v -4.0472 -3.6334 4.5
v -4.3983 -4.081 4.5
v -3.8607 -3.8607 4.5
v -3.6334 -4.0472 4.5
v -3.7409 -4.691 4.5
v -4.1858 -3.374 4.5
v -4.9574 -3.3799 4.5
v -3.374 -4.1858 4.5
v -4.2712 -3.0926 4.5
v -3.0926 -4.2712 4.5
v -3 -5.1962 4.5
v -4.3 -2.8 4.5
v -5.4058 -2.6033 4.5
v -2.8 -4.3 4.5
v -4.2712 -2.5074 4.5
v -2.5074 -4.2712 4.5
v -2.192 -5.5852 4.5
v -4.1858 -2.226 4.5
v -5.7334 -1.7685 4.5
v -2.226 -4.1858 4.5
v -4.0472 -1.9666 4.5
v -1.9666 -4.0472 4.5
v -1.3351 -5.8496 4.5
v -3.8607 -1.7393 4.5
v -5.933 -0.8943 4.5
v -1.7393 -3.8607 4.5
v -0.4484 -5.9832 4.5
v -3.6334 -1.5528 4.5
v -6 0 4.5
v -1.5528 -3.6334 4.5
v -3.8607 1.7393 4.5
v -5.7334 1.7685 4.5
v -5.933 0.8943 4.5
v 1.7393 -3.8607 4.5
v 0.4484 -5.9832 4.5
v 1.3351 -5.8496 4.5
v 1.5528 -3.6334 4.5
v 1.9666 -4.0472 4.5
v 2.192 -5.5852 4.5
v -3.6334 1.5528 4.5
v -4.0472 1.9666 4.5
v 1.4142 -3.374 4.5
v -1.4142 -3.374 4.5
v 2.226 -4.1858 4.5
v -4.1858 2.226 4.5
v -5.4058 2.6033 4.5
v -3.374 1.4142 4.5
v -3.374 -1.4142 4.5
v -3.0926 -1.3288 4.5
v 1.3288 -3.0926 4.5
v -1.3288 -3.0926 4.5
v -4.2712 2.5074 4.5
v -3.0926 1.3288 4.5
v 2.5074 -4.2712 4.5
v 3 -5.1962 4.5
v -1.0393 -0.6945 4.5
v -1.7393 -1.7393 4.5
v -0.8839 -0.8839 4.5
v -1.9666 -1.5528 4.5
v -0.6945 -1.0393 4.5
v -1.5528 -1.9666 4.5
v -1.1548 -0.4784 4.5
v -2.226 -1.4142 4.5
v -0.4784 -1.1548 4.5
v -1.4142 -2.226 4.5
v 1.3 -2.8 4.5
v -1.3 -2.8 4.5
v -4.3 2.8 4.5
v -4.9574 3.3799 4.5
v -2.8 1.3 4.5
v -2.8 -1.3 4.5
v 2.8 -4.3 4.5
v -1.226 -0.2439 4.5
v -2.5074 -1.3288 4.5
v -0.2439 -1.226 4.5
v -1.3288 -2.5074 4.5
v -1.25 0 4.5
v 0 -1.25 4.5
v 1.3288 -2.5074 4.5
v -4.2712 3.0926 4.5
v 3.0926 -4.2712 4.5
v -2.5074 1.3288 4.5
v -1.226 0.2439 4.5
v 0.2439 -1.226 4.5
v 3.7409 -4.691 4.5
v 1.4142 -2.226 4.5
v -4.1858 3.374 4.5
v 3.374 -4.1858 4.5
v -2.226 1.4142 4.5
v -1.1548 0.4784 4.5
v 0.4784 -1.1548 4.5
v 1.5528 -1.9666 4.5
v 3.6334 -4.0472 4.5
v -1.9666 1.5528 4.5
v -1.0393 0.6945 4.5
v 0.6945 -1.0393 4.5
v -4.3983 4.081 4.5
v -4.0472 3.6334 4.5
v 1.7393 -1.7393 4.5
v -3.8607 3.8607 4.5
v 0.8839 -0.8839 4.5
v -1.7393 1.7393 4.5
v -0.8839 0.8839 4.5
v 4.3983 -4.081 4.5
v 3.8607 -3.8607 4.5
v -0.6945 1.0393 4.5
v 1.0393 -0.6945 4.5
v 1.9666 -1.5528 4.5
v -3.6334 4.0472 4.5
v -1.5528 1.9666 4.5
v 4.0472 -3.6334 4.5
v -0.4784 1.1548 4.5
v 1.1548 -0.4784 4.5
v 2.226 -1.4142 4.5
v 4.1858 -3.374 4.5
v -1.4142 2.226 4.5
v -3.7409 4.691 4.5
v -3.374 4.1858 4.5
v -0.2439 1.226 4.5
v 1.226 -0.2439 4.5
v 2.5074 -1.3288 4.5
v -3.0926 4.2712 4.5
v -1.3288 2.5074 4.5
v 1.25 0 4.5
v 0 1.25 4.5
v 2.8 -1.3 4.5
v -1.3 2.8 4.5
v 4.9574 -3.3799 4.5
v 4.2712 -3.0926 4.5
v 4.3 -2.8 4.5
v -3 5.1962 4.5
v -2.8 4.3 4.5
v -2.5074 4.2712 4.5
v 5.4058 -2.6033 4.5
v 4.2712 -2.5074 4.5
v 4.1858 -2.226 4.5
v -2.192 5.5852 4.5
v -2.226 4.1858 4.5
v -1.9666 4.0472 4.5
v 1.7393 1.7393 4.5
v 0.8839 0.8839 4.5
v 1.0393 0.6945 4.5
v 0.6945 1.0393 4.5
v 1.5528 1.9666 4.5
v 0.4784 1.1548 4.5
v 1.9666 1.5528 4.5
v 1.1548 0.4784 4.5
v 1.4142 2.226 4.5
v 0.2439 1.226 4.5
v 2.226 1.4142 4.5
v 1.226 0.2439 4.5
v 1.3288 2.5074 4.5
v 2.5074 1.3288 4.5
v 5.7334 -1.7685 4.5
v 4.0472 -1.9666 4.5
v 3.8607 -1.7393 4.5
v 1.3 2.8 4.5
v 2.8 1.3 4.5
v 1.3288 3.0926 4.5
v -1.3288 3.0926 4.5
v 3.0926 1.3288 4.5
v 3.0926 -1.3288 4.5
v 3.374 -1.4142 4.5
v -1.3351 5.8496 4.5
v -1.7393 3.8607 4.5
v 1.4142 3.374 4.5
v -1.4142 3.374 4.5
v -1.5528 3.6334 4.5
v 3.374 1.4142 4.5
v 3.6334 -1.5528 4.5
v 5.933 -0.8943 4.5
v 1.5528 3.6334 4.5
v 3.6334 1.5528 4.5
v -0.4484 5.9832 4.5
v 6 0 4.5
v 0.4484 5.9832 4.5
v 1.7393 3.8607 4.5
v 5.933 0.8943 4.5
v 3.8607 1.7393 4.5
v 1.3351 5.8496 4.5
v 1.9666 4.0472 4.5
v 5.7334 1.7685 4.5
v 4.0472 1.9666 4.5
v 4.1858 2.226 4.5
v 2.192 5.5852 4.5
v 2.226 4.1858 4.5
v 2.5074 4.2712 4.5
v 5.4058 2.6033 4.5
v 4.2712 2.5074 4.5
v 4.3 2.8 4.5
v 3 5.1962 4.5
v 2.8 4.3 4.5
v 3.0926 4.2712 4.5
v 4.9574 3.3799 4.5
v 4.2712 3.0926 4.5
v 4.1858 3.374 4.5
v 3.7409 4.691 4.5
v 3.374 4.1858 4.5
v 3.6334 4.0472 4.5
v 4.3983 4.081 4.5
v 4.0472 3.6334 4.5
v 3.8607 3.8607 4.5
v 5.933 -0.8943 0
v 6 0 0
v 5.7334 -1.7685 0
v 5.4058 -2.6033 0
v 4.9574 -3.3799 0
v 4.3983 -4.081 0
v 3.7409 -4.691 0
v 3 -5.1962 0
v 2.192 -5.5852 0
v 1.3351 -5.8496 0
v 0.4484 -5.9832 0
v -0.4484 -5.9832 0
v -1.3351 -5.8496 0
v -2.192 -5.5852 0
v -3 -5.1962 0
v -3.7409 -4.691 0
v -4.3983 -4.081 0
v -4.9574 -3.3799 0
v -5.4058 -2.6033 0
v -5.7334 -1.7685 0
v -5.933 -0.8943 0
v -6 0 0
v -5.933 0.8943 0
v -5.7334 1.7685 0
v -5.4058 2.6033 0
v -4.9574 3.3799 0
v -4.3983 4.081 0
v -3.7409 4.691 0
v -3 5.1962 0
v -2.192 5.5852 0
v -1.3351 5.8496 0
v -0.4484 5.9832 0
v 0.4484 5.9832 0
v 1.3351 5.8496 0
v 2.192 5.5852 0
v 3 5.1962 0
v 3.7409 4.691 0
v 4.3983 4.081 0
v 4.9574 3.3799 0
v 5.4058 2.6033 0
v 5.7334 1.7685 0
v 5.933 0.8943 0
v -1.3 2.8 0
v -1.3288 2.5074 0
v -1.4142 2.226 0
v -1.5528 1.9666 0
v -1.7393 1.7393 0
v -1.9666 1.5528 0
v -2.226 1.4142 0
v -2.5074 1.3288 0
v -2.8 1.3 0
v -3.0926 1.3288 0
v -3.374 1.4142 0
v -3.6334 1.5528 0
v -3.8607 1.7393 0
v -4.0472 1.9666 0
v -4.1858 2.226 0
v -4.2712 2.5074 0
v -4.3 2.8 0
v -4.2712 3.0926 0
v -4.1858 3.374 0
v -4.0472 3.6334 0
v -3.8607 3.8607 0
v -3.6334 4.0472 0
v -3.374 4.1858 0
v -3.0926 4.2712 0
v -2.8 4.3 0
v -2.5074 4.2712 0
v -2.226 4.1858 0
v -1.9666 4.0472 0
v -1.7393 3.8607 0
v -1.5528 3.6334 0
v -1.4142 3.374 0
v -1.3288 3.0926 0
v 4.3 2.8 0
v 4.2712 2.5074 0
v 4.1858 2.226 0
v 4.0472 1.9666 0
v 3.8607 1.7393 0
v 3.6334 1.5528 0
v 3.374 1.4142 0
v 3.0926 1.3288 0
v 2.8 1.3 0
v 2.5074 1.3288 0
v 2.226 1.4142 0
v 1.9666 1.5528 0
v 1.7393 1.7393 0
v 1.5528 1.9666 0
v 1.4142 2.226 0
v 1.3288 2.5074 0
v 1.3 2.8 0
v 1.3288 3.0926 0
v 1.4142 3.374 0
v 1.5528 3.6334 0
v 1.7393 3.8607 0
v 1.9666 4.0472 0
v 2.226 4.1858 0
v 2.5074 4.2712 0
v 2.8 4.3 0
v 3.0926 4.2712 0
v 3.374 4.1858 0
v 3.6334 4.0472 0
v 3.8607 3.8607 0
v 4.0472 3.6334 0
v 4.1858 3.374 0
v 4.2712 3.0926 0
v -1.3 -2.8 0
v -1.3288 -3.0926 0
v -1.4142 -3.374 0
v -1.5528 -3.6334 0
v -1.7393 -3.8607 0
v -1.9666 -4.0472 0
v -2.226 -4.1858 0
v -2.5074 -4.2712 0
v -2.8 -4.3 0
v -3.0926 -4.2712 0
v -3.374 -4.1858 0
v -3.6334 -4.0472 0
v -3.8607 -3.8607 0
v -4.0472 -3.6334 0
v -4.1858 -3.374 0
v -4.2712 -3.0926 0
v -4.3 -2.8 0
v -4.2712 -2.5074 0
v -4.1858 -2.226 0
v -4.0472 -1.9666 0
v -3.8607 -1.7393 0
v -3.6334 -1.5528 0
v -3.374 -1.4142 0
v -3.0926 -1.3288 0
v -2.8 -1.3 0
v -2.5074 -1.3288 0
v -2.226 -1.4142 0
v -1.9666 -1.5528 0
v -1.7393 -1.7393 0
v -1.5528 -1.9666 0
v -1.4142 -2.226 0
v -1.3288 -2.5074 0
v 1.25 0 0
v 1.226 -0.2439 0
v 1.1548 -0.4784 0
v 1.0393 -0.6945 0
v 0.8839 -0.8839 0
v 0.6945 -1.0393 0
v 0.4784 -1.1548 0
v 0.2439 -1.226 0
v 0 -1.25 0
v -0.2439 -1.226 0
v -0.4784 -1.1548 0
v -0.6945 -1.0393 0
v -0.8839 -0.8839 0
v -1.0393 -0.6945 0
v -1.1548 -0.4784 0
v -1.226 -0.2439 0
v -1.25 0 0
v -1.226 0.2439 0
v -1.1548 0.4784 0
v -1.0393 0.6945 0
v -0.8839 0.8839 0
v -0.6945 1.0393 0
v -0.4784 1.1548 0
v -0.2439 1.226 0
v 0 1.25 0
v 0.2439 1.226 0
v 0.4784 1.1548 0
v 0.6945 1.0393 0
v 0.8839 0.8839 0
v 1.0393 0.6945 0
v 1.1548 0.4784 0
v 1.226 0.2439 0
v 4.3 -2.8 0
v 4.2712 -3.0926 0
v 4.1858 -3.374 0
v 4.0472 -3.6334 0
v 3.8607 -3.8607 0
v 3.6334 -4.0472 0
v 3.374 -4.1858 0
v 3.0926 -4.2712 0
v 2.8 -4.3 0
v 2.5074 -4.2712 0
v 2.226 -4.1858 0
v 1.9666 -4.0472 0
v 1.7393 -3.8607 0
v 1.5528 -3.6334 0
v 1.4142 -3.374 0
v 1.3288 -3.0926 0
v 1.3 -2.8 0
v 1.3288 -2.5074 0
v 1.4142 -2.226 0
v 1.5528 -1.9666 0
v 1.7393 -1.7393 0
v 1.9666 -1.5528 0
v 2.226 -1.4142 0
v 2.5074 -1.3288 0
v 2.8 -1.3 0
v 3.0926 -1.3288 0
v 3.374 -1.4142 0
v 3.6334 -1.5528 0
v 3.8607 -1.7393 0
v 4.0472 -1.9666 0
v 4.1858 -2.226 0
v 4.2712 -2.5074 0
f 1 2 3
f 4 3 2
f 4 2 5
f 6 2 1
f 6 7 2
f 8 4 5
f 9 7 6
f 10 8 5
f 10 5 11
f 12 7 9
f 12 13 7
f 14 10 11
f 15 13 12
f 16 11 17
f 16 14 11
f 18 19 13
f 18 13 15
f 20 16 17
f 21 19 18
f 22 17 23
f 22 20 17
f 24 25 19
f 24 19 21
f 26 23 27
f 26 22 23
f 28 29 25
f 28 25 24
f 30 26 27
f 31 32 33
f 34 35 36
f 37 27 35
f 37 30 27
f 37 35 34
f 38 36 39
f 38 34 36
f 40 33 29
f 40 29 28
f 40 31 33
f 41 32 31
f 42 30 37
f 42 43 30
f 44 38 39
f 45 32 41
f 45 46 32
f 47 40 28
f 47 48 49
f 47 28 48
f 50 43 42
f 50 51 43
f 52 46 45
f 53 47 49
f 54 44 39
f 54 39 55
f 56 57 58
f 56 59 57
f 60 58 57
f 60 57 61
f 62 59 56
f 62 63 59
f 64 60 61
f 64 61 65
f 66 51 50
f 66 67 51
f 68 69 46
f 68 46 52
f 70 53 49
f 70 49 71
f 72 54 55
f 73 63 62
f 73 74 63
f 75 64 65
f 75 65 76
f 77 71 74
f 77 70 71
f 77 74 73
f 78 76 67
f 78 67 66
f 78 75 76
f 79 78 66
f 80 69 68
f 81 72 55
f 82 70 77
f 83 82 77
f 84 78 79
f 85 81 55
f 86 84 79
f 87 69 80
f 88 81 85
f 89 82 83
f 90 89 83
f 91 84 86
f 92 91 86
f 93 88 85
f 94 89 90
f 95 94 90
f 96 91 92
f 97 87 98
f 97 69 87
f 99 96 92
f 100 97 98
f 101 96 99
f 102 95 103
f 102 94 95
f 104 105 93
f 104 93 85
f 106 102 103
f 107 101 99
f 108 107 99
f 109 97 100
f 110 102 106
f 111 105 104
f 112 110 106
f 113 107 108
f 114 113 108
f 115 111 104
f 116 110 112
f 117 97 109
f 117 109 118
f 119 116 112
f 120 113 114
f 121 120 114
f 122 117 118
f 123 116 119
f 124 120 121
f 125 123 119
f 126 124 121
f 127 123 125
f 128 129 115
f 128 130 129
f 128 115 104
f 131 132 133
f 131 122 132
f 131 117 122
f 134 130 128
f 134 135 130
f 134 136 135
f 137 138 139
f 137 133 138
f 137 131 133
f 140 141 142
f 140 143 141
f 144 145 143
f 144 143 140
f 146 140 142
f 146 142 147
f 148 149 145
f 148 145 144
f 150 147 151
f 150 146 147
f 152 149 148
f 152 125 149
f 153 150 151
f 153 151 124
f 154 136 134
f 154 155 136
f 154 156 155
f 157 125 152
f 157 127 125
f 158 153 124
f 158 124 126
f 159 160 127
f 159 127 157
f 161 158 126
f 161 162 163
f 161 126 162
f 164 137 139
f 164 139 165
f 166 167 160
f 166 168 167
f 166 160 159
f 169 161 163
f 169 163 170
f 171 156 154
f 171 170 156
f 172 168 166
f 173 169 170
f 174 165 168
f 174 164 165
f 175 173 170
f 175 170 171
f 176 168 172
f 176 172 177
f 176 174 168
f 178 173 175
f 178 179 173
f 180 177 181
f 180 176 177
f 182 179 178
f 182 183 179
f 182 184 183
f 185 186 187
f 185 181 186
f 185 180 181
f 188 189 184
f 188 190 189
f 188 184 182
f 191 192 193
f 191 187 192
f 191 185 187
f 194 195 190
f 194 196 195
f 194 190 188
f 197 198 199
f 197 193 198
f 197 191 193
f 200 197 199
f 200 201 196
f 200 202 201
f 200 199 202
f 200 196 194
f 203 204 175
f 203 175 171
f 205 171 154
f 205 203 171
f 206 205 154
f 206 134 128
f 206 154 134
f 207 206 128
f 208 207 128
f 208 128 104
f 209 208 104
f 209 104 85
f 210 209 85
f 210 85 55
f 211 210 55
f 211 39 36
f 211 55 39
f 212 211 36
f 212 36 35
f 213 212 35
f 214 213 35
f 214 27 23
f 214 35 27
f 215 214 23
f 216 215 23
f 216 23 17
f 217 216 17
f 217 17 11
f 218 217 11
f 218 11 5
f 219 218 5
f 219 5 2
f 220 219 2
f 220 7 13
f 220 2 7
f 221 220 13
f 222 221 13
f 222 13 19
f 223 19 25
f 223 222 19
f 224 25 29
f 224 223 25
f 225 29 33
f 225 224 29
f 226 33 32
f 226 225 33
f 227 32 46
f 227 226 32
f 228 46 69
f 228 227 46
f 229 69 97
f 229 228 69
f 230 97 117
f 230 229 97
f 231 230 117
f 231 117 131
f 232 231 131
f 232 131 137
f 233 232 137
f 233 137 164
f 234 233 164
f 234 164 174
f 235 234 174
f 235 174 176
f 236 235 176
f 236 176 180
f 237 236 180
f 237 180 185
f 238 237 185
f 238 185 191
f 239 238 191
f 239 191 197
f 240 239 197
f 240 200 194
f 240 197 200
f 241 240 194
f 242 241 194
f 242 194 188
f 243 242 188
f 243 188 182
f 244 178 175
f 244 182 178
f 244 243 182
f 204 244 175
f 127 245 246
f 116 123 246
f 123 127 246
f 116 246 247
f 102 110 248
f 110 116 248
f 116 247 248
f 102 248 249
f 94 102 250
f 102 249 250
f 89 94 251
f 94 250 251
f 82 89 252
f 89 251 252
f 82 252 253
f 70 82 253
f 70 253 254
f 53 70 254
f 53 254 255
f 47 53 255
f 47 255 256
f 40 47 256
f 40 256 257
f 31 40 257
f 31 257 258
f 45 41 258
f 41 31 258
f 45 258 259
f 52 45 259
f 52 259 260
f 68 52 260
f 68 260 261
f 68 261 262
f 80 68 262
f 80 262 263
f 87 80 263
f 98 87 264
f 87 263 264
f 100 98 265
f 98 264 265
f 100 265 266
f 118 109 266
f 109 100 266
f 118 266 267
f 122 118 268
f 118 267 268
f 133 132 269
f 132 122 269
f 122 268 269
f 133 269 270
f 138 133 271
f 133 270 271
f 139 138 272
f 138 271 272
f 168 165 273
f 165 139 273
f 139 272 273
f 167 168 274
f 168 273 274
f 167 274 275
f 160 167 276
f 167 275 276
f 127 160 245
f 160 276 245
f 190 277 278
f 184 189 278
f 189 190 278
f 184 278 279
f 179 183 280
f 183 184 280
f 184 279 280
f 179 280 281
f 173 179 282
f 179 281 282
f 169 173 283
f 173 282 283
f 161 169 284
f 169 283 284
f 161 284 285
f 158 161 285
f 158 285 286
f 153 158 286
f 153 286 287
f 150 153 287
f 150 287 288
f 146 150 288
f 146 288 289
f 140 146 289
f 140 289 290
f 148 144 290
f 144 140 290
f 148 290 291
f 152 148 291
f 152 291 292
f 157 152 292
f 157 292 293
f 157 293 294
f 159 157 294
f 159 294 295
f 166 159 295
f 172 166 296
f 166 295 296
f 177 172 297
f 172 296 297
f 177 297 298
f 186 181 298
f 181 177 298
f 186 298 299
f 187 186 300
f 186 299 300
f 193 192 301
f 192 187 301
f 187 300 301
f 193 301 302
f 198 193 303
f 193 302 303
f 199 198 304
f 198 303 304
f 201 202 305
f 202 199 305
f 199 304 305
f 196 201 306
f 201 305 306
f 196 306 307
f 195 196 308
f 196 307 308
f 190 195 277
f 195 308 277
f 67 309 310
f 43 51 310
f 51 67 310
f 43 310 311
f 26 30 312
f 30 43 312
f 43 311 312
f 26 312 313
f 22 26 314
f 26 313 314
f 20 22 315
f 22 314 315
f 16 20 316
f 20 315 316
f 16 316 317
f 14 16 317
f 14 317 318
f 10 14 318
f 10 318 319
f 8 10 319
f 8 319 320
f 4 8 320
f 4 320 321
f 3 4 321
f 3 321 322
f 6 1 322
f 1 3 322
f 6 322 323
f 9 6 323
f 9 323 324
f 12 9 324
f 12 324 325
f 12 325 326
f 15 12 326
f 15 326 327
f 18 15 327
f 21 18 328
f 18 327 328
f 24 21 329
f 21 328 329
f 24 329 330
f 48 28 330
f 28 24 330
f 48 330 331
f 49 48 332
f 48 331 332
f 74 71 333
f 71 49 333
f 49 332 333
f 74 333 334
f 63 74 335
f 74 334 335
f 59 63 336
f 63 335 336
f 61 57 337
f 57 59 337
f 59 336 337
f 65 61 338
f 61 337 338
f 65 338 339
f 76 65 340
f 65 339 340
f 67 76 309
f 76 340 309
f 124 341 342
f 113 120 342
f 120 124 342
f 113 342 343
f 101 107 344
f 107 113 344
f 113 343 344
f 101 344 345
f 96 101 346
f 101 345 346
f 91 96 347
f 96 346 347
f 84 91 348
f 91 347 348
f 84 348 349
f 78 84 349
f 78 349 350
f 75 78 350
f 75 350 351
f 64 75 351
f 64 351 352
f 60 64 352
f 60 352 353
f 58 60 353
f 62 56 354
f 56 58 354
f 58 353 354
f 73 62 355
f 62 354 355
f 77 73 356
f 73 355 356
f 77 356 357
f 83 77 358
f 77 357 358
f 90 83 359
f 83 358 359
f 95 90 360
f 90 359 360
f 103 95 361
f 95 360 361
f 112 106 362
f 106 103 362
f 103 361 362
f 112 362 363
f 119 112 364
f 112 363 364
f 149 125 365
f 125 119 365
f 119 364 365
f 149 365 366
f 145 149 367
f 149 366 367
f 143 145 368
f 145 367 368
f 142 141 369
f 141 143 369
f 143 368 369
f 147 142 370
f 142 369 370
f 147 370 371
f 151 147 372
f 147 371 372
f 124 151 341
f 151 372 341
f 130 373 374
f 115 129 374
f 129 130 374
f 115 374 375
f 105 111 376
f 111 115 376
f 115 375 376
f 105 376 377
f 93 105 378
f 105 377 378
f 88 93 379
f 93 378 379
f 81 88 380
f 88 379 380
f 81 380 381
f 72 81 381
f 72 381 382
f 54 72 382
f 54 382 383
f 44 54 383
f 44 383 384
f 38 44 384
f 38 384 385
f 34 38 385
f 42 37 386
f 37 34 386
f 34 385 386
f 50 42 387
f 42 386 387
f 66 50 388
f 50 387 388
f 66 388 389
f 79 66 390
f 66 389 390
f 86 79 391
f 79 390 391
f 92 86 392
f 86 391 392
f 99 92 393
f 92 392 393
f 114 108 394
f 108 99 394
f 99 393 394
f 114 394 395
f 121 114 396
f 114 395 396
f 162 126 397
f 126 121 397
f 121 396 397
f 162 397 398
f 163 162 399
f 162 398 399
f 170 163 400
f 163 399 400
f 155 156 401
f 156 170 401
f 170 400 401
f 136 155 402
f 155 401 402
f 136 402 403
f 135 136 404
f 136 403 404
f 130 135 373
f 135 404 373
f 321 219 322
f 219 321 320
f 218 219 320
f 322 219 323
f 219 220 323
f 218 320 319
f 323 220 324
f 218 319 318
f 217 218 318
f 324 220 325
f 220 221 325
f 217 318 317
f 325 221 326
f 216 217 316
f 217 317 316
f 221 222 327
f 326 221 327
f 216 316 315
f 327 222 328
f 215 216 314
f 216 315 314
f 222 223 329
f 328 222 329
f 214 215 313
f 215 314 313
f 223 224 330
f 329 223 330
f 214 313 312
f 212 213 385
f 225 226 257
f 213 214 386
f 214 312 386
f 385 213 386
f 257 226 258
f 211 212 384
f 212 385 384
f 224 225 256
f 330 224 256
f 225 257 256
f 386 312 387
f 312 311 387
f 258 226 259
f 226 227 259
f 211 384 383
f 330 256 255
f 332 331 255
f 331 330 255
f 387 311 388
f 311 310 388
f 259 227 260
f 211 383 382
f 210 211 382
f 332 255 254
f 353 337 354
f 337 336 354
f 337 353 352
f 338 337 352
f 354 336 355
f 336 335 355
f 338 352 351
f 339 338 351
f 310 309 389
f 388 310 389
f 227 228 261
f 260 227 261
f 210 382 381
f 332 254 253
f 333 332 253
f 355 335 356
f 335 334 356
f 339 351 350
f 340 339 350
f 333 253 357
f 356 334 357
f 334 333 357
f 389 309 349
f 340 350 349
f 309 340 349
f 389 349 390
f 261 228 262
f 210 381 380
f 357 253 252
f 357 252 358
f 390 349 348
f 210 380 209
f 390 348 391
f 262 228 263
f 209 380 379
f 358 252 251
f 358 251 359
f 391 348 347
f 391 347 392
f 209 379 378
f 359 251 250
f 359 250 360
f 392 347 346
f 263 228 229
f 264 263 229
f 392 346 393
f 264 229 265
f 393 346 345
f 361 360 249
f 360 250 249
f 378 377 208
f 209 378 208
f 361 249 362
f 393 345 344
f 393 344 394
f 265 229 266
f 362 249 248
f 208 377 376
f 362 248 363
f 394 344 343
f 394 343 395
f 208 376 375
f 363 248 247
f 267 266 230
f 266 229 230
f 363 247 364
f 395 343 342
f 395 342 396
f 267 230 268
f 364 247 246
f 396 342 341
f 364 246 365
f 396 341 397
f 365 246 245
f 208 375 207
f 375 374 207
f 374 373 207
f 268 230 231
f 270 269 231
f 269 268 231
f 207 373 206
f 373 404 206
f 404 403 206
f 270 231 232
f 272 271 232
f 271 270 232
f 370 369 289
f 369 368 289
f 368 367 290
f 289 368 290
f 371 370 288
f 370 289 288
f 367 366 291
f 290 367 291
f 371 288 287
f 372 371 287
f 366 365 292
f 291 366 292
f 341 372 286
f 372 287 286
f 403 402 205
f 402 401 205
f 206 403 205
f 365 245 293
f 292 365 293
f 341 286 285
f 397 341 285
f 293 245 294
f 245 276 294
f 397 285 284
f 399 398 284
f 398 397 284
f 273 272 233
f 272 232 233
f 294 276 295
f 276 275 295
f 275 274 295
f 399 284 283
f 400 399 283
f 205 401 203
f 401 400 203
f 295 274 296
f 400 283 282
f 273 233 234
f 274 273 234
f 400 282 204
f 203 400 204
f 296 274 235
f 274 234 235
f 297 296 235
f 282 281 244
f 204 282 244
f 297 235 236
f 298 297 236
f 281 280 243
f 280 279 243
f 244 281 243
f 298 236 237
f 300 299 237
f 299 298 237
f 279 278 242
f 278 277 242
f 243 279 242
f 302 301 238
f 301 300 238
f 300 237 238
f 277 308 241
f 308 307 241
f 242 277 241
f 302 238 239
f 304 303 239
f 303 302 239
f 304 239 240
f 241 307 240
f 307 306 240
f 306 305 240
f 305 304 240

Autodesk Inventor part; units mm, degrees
ref_plane "YZ Plane" through (0, 0, 0) normal (1, 0, 0) x (0, 1, 0)
ref_plane "XZ Plane" through (0, 0, 0) normal (0, 1, 0) x (-1, 0, 0)
ref_plane "XY Plane" through (0, 0, 0) normal (0, 0, 1) x (1, 0, 0)
sketch "スケッチ1" plane through (0, 0, 0) normal (0, 0, 1) x (1, 0, 0)
  circle A0 centre (0, 0) radius 8
  circle A1 centre (0, 0) radius 6
  circle A2 centre (0, 0) radius 1.25
  circle A3 centre (-2.8, -2.8) radius 1.5
  circle A4 centre (-2.8, 2.8) radius 1.5
  circle A5 centre (2.8, 2.8) radius 1.5
  circle A6 centre (2.8, -2.8) radius 1.5
  circle A7 centre (0, 0) radius 6
  dimension "d0" = 16
  dimension "d1" = 12
extrude "押し出し1" add sketch "スケッチ1" along normal blind 4.5 contours A1
properties part number "新型３脚最終段カム2" material "アルミニウム 2014-T4"
